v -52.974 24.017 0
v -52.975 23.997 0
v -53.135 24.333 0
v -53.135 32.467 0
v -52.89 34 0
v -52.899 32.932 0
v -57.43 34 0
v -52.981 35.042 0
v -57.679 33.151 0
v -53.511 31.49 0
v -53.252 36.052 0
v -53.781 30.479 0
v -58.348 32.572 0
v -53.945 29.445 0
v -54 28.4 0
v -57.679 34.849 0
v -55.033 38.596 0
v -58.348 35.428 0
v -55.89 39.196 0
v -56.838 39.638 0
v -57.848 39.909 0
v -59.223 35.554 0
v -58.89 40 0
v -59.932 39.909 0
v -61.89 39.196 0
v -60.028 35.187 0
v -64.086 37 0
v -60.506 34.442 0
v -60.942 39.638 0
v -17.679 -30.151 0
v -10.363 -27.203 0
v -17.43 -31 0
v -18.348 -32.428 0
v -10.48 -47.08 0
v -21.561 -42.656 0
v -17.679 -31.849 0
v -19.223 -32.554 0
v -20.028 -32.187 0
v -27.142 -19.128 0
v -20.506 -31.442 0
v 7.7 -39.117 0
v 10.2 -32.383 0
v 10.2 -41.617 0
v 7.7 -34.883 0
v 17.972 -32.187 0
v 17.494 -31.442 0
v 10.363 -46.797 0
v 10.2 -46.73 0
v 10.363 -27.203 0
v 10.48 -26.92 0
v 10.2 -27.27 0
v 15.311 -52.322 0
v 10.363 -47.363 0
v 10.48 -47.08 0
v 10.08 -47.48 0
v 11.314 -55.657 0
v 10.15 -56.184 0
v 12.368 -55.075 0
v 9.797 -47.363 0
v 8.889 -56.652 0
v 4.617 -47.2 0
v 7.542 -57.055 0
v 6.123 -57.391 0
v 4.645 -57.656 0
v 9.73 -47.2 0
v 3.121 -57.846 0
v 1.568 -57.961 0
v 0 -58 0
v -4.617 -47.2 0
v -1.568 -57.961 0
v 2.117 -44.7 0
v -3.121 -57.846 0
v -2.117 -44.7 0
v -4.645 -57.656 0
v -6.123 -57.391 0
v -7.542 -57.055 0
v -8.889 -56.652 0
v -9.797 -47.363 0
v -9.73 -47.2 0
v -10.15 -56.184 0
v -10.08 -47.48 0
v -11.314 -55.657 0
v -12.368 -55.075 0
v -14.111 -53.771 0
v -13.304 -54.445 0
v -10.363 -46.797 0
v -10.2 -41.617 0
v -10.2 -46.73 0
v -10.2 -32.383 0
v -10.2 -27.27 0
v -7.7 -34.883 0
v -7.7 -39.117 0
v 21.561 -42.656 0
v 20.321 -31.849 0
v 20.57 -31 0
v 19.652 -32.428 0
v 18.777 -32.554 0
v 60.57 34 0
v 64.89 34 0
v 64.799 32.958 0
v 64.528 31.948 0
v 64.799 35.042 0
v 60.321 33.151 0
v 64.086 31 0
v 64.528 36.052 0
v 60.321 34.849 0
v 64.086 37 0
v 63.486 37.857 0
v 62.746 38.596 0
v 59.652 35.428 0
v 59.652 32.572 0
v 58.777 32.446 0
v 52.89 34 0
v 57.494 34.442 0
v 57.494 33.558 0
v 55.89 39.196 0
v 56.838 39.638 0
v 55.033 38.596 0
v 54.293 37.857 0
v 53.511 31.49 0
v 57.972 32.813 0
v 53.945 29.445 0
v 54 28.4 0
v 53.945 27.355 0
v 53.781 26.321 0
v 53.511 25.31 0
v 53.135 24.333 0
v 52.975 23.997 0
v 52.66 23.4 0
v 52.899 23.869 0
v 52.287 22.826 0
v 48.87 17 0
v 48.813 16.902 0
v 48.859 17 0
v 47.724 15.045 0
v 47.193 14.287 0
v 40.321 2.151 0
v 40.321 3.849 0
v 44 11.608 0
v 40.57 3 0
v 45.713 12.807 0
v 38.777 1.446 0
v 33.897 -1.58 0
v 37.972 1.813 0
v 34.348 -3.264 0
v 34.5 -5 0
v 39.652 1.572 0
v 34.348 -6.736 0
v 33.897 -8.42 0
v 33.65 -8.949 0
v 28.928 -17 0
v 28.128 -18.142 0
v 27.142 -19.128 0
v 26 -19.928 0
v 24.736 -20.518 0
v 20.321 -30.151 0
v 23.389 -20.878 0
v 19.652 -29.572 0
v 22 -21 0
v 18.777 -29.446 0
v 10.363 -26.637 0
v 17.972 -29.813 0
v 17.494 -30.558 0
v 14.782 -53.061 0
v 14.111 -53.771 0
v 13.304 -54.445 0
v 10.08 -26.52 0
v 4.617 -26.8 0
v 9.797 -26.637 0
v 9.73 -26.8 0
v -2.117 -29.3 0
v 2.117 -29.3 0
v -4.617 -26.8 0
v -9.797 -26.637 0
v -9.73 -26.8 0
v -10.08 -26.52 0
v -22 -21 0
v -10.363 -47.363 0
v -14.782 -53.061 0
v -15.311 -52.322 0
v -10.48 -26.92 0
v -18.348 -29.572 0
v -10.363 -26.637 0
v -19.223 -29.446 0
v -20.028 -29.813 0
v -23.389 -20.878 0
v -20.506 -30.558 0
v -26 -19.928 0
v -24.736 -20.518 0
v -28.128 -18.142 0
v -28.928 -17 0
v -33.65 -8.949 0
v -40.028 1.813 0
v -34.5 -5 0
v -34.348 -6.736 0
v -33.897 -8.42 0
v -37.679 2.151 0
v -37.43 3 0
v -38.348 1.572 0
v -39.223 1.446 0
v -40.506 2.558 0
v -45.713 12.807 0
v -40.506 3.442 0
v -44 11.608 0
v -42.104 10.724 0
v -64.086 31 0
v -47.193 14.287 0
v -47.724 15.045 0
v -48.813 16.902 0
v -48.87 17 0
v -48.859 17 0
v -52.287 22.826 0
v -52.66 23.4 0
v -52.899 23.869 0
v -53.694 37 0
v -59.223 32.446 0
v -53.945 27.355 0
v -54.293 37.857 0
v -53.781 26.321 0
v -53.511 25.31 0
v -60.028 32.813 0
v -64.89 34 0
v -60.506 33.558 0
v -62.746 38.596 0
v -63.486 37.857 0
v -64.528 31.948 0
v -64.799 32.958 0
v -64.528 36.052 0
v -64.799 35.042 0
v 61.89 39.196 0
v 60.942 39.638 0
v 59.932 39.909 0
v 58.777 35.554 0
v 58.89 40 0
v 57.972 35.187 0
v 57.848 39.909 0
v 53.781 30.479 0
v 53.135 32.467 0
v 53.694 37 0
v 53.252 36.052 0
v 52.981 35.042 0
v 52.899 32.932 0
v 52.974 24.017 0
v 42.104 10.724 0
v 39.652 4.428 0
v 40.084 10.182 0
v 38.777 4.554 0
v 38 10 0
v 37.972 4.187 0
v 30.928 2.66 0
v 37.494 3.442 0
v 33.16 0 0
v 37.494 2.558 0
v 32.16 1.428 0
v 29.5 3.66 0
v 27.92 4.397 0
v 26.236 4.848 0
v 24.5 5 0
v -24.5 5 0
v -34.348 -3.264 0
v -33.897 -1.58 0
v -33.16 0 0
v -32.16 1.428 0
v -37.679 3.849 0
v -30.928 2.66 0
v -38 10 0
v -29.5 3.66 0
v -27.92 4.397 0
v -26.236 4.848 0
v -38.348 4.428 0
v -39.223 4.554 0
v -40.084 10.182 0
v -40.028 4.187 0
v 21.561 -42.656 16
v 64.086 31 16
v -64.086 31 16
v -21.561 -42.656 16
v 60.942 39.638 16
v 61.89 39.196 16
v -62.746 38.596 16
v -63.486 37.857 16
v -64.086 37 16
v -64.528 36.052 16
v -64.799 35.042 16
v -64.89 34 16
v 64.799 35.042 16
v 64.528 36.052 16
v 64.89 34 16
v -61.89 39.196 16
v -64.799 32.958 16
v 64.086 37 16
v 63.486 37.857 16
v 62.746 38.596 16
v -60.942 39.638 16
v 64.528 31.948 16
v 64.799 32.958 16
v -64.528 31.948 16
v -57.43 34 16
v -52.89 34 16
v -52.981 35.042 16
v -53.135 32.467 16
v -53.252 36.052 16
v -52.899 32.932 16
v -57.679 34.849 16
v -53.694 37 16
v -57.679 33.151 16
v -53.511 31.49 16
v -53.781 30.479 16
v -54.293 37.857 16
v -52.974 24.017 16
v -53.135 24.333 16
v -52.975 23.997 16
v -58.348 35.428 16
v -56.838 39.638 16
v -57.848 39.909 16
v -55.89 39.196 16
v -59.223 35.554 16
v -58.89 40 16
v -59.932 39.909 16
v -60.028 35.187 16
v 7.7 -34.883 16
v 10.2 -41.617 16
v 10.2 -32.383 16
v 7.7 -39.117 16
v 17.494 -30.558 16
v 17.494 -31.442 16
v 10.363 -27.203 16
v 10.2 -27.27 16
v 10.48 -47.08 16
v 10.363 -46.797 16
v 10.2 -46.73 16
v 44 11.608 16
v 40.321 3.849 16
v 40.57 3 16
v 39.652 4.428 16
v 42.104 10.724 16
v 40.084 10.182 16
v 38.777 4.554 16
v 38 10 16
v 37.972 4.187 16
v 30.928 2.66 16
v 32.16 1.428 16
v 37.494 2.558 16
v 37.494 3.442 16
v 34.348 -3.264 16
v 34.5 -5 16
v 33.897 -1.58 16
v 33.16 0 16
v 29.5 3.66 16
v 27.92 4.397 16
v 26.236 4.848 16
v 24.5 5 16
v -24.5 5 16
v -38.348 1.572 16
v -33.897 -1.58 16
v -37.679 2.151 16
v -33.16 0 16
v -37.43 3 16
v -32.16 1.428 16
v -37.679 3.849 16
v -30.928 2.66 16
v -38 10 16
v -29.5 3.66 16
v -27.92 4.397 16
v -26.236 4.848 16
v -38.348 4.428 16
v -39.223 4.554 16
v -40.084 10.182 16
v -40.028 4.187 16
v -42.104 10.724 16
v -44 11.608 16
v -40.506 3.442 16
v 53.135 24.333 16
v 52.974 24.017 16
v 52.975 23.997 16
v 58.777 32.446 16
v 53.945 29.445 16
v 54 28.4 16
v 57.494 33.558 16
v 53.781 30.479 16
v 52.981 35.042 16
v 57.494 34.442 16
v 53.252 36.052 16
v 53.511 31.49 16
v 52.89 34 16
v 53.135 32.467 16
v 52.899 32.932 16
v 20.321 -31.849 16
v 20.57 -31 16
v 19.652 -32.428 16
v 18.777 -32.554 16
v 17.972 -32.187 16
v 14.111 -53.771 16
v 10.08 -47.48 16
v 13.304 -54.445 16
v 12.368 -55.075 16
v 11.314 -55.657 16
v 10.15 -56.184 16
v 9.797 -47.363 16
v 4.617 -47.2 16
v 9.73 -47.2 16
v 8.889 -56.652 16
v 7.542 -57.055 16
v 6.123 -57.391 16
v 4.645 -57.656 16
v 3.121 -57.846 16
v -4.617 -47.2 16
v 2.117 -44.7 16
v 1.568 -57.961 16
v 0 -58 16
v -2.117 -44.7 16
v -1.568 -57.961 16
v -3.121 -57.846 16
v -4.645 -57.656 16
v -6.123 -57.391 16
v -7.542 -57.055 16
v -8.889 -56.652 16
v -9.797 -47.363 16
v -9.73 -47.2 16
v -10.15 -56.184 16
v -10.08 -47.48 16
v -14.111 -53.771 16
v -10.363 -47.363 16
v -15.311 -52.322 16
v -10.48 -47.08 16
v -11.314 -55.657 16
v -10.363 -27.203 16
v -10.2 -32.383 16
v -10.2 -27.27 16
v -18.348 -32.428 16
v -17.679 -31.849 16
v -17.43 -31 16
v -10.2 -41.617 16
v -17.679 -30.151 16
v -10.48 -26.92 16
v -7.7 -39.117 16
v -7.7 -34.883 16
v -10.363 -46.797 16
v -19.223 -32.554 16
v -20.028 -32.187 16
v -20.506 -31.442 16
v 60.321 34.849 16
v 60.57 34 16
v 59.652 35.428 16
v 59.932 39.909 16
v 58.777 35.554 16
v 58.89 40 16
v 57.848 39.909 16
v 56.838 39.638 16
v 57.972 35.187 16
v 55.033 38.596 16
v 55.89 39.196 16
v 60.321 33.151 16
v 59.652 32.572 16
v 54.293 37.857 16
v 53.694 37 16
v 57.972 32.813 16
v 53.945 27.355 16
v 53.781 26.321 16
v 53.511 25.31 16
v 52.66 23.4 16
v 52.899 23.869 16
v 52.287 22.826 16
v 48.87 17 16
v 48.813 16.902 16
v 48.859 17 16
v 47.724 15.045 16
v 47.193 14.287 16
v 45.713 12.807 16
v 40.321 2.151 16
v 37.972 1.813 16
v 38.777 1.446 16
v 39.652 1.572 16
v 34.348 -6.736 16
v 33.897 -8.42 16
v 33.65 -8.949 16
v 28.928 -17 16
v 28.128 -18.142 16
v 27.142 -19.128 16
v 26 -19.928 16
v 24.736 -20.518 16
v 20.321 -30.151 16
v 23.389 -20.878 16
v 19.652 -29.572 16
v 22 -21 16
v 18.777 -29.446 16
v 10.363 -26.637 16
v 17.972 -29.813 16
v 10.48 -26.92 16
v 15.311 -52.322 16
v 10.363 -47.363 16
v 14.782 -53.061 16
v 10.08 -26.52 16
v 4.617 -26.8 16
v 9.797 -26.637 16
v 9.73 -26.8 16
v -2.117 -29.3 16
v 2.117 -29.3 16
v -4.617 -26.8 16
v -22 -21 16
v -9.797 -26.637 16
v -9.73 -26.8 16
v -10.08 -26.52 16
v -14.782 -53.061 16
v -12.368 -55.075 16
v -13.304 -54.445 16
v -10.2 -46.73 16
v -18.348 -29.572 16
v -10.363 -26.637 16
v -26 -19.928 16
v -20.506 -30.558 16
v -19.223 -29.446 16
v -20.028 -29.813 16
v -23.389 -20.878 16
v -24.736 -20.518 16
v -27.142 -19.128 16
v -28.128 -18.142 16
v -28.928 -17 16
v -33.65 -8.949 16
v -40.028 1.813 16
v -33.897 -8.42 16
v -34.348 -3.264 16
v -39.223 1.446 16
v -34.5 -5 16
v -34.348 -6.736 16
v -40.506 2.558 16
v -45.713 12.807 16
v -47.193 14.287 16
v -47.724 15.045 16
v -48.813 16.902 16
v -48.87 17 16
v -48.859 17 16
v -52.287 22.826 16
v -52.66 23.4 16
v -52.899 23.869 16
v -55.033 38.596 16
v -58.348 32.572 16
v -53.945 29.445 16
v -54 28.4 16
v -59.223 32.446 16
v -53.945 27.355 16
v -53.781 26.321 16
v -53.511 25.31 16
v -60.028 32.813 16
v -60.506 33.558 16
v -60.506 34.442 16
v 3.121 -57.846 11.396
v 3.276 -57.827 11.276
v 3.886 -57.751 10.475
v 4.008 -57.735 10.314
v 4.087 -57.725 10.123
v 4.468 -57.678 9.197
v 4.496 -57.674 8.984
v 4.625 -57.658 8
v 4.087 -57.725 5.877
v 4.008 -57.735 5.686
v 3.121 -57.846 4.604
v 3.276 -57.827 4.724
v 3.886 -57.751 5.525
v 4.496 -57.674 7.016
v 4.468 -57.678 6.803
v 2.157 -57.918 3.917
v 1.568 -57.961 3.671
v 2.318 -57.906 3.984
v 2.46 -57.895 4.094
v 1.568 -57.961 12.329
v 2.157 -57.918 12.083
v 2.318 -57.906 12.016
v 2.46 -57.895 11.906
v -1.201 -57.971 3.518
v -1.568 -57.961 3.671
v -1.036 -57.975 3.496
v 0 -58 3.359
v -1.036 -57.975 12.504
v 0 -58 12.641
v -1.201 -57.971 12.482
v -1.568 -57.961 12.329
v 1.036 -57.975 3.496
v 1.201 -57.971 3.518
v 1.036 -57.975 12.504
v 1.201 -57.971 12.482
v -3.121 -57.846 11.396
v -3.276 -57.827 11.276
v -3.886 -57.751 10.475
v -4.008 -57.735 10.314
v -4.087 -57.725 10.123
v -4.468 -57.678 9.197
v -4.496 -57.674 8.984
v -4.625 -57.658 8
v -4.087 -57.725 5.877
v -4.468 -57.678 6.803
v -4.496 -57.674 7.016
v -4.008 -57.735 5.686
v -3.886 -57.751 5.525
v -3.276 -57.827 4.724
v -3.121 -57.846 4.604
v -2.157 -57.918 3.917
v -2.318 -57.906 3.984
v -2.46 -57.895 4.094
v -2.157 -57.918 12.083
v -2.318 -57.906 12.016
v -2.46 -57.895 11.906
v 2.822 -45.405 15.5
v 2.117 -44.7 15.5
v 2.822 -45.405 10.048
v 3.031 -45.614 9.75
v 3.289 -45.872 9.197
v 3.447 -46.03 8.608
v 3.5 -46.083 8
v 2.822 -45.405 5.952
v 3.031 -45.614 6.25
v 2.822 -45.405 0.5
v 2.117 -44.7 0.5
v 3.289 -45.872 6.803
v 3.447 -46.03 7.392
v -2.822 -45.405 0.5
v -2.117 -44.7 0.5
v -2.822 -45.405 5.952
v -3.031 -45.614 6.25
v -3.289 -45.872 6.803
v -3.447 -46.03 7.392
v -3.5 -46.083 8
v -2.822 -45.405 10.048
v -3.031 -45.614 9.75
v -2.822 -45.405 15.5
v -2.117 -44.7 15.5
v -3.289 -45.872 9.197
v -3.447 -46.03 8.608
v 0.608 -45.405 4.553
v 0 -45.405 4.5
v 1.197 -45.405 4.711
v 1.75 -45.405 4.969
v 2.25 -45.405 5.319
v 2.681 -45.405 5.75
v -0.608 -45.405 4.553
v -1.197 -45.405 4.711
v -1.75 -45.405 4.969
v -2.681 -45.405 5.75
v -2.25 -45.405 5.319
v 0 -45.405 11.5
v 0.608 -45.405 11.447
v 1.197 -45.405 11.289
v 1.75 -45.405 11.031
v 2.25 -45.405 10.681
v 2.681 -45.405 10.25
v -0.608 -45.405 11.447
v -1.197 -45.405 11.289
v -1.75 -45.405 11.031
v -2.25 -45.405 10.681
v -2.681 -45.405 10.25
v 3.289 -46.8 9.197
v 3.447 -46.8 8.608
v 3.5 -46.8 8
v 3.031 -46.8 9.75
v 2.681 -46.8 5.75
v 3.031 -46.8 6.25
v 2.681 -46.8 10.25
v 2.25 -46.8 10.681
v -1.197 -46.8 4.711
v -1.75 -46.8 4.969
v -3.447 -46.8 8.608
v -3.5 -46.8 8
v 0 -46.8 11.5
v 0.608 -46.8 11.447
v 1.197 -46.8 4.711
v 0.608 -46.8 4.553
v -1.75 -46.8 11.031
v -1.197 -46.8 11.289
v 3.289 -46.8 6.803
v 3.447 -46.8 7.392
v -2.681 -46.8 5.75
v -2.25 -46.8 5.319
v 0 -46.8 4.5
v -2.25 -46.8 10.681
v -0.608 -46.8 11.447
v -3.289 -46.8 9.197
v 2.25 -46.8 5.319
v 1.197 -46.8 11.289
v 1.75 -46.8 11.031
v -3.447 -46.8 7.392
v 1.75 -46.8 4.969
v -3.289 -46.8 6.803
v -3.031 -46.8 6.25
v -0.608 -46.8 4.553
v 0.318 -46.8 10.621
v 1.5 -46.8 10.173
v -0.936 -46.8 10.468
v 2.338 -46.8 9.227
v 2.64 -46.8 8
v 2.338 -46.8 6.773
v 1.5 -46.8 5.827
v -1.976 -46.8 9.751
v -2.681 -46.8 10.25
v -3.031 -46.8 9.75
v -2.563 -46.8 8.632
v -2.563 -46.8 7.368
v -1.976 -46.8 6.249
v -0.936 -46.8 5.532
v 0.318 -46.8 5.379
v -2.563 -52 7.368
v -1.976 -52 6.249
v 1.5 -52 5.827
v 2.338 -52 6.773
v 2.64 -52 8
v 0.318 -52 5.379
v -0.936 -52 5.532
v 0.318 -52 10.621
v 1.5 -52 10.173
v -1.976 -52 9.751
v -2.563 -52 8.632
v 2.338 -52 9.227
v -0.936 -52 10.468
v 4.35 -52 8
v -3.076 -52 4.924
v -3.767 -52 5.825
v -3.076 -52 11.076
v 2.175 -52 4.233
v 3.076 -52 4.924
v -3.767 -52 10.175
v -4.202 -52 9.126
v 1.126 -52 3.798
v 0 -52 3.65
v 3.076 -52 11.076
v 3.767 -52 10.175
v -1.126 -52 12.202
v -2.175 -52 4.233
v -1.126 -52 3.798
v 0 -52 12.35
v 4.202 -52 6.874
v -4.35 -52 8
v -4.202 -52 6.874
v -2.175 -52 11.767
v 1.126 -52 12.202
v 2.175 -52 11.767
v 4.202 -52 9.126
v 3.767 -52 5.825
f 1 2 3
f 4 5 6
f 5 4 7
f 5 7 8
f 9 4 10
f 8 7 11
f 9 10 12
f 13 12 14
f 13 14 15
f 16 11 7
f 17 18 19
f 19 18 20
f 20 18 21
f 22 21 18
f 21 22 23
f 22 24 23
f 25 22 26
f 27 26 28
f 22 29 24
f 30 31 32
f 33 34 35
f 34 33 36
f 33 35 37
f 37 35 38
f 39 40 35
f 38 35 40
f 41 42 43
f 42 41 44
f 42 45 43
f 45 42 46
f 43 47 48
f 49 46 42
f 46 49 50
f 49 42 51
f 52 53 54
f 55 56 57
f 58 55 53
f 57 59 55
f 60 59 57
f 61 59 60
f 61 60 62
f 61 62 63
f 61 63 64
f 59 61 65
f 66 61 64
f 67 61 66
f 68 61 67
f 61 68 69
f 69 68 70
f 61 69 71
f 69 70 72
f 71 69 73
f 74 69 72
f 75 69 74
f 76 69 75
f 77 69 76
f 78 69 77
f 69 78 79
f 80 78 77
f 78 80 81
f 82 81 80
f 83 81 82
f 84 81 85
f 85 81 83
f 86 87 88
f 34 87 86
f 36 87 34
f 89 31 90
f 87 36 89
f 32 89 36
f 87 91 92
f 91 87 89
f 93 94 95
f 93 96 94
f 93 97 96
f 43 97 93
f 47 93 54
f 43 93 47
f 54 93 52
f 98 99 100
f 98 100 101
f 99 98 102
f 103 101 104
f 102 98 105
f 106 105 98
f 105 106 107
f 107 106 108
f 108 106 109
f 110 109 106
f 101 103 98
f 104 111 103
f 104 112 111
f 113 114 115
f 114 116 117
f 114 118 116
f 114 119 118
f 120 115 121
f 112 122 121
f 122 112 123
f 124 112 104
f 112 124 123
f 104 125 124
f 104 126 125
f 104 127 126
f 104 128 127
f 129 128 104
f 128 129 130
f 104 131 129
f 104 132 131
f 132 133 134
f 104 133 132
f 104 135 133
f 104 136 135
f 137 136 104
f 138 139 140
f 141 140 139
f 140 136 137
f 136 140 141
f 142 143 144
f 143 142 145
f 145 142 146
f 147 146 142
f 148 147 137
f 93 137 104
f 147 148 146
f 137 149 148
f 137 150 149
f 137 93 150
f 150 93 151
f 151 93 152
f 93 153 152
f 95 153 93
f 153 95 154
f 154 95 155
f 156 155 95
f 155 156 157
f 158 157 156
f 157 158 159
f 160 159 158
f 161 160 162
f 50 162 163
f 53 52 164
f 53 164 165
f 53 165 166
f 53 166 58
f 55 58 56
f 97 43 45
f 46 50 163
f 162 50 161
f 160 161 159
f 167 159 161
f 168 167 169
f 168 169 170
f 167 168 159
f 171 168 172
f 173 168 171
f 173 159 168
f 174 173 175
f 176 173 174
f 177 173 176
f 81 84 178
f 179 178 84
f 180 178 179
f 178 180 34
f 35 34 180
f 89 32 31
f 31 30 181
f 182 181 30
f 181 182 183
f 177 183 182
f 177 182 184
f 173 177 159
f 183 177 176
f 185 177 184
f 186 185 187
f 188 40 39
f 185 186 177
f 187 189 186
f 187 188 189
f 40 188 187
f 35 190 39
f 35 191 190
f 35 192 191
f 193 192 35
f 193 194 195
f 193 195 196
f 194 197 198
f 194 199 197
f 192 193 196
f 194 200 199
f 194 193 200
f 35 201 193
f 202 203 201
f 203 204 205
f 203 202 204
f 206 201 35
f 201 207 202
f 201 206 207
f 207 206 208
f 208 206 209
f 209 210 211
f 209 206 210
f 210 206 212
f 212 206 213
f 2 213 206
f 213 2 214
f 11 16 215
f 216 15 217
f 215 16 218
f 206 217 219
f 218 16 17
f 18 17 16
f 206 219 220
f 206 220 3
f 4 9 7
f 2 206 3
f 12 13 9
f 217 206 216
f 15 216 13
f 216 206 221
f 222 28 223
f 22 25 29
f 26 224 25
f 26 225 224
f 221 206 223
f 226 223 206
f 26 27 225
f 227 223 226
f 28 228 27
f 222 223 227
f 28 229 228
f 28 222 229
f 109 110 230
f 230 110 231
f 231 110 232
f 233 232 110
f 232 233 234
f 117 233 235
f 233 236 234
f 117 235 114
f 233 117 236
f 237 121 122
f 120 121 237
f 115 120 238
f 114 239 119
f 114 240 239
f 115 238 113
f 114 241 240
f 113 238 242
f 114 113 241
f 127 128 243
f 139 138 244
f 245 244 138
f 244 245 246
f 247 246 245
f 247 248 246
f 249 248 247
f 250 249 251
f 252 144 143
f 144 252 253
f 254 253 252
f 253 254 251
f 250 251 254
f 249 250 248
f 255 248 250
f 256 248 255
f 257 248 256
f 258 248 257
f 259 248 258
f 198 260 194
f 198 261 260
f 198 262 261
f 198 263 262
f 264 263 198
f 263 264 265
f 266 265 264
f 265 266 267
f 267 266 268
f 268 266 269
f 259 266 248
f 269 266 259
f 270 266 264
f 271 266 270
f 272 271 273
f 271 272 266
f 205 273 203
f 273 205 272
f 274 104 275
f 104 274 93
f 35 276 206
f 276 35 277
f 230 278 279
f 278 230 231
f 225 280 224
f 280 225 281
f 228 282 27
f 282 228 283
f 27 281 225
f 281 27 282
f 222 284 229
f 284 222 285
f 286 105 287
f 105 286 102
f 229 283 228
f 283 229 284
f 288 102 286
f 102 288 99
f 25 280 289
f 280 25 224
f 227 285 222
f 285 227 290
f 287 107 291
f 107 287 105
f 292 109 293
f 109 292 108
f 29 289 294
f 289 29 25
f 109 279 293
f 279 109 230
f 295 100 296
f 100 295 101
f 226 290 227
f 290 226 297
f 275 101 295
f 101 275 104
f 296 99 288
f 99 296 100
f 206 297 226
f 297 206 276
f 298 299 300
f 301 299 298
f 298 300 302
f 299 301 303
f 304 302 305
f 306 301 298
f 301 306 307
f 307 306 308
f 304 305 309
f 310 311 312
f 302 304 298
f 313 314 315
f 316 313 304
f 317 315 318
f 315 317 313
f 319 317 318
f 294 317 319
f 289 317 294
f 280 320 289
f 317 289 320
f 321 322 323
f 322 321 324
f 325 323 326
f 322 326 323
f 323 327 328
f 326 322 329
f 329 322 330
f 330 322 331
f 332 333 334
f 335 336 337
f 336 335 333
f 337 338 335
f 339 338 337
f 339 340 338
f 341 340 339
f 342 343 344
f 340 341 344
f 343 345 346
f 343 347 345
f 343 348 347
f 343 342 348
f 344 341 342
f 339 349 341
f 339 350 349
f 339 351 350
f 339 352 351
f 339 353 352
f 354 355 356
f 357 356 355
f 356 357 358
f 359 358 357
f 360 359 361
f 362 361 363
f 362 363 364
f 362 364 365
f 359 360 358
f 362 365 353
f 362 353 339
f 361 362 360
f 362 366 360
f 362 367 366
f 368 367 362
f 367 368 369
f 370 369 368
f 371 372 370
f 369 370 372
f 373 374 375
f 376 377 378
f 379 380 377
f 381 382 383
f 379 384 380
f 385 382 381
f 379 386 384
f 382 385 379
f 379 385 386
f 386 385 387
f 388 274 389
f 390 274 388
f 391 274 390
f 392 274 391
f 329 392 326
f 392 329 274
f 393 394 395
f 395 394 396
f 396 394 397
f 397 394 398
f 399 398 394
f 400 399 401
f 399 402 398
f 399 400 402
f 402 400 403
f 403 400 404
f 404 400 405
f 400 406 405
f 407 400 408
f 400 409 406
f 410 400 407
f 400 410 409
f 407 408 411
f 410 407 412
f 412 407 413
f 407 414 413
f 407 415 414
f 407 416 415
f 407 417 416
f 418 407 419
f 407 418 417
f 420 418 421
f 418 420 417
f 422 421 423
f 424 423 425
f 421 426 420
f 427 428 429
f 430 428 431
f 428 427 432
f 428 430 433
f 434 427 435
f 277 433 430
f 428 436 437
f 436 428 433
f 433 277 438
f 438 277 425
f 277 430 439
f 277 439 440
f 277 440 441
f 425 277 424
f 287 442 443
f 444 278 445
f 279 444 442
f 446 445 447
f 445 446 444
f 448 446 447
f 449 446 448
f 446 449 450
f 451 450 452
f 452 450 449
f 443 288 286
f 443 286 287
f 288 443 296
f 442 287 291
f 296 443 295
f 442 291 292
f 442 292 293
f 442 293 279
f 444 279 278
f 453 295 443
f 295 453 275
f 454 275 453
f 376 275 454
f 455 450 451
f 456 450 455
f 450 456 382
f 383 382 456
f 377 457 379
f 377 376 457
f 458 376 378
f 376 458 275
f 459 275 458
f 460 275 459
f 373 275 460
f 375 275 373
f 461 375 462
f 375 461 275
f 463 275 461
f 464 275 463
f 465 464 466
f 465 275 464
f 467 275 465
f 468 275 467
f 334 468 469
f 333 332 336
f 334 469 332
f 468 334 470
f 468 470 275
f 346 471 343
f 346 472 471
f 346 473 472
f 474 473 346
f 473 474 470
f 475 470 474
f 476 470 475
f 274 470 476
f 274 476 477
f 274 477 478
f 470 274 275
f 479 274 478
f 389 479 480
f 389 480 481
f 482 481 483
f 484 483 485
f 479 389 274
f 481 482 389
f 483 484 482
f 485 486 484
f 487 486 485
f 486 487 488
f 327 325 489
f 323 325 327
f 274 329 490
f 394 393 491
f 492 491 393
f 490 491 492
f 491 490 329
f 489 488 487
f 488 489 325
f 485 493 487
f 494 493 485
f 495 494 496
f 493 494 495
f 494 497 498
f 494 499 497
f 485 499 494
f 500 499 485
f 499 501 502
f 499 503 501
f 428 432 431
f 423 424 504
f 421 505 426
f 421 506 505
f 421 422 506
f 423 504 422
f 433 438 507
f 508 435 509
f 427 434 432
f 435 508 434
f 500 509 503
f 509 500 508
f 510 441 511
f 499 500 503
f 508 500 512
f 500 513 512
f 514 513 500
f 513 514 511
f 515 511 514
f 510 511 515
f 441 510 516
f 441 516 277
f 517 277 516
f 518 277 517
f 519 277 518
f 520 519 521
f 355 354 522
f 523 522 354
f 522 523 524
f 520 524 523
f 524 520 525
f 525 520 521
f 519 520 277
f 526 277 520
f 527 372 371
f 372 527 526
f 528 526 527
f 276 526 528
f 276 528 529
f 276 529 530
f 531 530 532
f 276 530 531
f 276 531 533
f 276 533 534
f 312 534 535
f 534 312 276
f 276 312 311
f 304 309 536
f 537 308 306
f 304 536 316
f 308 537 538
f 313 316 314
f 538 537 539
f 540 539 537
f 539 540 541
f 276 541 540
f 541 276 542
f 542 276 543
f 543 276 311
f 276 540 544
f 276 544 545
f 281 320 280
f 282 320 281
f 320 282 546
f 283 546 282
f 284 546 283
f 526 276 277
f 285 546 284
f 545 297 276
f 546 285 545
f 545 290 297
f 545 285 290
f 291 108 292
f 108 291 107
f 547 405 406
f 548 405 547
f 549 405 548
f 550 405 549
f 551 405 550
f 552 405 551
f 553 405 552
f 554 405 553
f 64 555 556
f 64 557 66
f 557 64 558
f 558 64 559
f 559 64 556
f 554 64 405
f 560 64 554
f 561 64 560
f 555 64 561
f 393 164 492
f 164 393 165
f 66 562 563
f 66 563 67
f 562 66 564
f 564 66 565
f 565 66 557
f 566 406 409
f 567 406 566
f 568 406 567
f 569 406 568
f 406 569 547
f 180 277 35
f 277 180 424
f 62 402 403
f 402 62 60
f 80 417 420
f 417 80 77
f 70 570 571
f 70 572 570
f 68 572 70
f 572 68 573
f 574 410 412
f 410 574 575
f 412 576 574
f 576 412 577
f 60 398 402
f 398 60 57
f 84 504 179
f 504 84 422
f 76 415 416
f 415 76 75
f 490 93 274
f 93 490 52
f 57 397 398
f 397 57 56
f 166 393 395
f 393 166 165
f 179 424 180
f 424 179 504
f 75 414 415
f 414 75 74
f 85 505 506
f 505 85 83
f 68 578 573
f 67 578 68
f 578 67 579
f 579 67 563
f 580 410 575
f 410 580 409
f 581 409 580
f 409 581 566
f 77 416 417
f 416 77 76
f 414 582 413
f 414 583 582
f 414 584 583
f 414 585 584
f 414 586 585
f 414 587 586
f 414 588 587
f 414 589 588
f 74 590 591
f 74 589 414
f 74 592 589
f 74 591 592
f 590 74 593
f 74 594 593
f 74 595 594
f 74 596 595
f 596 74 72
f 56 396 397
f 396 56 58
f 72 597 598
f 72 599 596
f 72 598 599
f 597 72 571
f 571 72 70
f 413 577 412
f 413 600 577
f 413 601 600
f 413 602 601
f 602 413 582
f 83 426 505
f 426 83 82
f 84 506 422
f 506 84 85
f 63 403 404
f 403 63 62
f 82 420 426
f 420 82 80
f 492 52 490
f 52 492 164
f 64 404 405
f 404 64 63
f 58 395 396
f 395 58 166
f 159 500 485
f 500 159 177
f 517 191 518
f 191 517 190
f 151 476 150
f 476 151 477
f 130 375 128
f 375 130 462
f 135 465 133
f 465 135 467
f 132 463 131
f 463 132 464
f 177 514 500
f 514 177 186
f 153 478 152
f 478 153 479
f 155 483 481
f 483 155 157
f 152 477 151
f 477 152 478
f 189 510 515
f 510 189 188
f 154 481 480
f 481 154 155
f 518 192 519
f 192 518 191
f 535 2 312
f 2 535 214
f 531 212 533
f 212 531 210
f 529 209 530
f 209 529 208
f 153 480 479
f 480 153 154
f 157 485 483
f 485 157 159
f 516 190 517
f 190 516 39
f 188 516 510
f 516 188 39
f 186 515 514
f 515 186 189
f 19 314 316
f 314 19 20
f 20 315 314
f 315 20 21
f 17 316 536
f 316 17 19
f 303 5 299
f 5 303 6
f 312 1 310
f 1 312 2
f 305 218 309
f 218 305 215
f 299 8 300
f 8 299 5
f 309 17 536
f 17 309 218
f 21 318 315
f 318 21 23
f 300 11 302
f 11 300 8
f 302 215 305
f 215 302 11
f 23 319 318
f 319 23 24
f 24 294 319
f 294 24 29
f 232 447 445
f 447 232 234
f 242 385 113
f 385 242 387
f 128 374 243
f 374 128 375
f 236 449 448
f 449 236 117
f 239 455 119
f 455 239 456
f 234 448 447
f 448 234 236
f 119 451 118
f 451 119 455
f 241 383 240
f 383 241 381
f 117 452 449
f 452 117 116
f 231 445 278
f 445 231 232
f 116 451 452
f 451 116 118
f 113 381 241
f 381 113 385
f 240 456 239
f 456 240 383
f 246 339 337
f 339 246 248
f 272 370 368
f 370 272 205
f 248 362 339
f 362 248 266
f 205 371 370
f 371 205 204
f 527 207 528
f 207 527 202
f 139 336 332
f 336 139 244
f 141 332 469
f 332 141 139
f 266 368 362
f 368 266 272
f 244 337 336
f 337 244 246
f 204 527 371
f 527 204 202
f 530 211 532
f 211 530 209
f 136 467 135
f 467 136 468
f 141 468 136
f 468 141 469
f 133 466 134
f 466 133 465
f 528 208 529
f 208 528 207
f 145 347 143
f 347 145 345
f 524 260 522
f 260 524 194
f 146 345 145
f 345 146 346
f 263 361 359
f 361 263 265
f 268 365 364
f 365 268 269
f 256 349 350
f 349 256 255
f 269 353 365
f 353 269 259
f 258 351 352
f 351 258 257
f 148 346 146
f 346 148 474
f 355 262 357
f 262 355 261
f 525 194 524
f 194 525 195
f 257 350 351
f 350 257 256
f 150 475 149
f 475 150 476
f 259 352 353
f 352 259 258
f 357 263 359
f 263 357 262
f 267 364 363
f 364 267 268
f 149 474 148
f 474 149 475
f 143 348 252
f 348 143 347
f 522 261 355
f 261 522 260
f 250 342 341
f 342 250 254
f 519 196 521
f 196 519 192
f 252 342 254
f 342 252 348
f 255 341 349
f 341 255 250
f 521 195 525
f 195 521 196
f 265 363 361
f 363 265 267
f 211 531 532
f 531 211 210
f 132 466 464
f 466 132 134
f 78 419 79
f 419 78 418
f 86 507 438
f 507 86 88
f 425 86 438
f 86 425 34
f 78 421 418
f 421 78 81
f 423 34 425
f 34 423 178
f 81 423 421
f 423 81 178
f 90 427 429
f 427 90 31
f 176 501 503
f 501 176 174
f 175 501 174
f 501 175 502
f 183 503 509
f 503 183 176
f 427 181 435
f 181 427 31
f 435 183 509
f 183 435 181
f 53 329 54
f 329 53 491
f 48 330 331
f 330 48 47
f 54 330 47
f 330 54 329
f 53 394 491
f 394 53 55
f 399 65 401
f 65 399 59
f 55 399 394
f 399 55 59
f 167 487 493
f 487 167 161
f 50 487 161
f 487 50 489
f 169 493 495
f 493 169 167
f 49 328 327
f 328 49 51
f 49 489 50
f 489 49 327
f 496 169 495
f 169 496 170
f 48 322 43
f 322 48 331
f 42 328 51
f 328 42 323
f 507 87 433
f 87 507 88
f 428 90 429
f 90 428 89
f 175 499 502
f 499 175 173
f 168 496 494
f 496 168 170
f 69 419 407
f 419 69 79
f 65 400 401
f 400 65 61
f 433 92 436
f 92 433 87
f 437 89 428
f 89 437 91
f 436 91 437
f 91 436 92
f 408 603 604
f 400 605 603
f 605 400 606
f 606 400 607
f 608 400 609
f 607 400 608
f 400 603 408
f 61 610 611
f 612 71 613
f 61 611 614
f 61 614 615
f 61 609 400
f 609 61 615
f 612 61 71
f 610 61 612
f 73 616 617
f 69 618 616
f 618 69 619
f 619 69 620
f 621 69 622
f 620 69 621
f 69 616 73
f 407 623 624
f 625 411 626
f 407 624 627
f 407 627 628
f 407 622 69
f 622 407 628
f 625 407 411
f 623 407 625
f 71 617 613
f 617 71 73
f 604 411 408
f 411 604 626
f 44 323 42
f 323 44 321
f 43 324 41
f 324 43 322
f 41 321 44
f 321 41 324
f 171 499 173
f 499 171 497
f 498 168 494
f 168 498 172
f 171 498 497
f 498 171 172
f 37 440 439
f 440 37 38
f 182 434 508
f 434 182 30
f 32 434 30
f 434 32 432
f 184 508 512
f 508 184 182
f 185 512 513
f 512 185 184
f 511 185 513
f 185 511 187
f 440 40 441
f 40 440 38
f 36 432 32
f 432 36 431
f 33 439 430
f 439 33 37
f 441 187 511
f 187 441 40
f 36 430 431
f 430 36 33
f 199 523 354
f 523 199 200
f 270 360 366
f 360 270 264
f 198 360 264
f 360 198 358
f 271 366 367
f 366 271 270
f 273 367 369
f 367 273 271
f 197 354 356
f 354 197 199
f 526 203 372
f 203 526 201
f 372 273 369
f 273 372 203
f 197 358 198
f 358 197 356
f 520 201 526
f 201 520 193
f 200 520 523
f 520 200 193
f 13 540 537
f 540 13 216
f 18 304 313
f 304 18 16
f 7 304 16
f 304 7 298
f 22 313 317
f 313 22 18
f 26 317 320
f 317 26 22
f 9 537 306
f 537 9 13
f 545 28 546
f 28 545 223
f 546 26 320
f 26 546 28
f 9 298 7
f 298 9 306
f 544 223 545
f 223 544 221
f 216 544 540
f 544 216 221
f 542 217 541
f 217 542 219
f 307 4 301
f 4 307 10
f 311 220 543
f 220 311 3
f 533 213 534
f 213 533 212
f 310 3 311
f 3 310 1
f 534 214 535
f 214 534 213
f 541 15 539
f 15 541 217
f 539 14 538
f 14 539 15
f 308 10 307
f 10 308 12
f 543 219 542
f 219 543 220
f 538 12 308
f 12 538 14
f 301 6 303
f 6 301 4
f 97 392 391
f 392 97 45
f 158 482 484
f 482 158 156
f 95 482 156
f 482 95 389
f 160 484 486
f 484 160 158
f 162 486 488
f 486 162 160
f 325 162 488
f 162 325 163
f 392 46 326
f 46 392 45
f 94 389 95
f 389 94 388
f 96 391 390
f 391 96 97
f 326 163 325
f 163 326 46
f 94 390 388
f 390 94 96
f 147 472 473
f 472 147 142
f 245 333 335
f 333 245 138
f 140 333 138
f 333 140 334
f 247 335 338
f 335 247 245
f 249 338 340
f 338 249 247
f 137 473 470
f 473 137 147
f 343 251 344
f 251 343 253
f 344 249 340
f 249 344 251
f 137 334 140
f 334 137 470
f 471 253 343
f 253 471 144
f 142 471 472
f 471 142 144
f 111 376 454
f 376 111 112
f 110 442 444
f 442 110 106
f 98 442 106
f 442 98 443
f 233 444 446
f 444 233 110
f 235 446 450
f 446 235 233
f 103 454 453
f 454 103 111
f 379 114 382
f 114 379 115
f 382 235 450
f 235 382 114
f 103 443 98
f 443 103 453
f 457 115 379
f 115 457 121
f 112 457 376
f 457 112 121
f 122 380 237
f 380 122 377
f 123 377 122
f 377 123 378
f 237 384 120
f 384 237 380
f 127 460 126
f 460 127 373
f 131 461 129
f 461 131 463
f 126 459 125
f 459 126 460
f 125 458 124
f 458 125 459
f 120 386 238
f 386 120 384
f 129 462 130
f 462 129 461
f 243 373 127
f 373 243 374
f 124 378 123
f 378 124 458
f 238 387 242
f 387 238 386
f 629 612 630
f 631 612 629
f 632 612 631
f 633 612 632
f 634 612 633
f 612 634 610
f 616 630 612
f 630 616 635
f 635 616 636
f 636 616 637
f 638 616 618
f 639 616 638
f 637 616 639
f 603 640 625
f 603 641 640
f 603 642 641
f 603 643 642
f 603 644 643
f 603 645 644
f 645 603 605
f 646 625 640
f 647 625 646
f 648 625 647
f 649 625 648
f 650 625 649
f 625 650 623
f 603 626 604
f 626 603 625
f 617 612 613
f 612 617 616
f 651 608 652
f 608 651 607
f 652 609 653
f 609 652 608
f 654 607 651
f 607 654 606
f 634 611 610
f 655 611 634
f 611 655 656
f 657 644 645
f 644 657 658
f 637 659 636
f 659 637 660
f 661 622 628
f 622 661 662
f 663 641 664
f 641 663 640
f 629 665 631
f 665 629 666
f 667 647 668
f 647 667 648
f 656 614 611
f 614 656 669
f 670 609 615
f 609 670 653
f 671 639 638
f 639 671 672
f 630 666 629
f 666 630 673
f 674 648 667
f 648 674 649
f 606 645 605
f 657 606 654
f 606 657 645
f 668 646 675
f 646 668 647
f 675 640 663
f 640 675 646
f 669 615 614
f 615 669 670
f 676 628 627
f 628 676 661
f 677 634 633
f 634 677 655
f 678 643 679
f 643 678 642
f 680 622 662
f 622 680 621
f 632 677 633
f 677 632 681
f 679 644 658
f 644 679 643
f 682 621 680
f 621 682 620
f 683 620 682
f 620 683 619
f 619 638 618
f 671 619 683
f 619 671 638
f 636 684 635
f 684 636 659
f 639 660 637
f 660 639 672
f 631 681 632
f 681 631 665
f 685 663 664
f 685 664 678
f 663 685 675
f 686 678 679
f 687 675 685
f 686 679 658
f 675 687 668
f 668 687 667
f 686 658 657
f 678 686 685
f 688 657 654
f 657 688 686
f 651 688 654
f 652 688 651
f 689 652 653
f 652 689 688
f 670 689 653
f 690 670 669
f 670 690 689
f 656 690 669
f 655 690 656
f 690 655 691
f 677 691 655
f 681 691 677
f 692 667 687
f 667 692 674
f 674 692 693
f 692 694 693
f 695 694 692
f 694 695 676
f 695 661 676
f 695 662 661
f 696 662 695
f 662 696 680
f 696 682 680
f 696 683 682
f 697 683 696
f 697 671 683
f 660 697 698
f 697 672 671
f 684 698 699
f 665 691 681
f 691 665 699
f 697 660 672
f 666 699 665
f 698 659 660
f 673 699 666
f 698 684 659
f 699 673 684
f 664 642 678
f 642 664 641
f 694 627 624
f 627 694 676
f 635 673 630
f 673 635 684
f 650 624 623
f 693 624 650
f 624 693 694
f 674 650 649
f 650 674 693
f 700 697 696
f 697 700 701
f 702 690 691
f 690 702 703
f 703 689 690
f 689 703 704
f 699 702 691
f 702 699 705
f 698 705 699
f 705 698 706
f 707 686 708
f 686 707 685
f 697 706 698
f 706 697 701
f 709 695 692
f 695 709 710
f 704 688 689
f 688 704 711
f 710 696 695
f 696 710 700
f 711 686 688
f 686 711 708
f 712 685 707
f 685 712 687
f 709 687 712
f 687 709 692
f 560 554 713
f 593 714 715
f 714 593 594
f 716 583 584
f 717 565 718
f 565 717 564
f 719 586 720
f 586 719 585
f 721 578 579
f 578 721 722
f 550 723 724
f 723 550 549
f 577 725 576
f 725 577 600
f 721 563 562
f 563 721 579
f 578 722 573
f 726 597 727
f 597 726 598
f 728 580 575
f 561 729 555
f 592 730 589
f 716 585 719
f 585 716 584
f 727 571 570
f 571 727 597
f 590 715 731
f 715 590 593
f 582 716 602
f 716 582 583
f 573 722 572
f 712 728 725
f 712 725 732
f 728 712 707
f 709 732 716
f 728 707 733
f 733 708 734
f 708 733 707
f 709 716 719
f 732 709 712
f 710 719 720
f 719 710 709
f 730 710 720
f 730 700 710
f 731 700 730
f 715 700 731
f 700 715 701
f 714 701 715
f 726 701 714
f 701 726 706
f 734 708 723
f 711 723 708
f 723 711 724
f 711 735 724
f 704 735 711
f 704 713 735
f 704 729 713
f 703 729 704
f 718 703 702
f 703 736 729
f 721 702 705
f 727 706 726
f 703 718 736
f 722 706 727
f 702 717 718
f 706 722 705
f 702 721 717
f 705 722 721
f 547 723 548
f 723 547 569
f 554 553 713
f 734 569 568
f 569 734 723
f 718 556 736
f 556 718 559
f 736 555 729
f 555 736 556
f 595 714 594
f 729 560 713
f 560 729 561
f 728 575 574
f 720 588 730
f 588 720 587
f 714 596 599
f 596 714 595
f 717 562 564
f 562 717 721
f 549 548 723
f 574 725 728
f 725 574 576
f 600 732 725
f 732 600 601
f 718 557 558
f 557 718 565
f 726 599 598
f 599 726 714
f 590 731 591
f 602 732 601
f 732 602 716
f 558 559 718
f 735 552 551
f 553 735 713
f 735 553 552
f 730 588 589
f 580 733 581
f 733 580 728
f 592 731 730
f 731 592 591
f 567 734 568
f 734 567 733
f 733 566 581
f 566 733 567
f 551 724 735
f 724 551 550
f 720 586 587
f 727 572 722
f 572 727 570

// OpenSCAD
// file: ext20v.scad
// cut-out model to fit Openbuilds V-Slot 20mm extrusion

// fuzz is -1/2 kerf for a laser cutter,
// or the amount of extrusion spread for a 3D printer

module slotV(len,fuzz,verbose) {
// center of square cylinder for V cut-out is 1mm outside of extrusion.
// outside border of extrusion is 1.9mm.  inner slot width is 6.35mm, but
// corners are beveled, so ideal corner would be less
// 1/2 slot width is the same dist as sr-(1+1.9), hence
sr = 1+1.9+(6.2/2);
  difference() {
    // having testing trouble.  I don't want to worry about v-slot tab yet.
    // make it extra small until I'm really ready to tweak it (remove -.3)
    translate([-10-1,0,0]) cylinder(r=sr-fuzz*sqrt(2)-.3,h=len,$fn=4);
    translate([-8+.3+4/2,0,len/2]) cube([4,7,len],center=true);  // arbitrary .3mm extra lip to tab
  }

  // actual slot profile
  if(verbose % 2) %hull() {
    translate([-10+2+1.2/2,0,len/2]) cube([1.2,10.6,len],center=true);
    translate([-5,0,len/2]) cube([2,4,len],center=true);
  }
}

module ext20(len,fuzz=0,verbose=3) {
w=20+2*fuzz;
w2f = w/2 - 0.6*abs(fuzz);  // offset to center of corner stress relief loop
rc = (abs(fuzz) < 0.1) ? 0.2 : 2*abs(fuzz);  // radius of corner releif loop
ro=1;
$fn=24;
  difference() {
    union() {
      translate([0,0,len/2]) cube([w,w,len],center=true);
      for(i=[-1,1]) for(j=[-1,1]) // extra clearance around corners
        translate([w2f*i,w2f*j,0]) cylinder(r=rc,h=len,$fn=8);
    }

    translate([0,0,-1]) {
      for (a=[0,90,180,270]) {
        rotate([0,0,a])
          slotV(len+2,fuzz,verbose);
      }
      if (floor(verbose/2) % 2) %cylinder(r=2,h=len+2);
    }
  }
}

if (0) { // notional display
  translate([0,0,4]) ext20(5,0.2);
  ext20(5,0);
  translate([0,0,-4]) ext20(5,-0.2);
} else {
  // quality of fit cutout test cut/print
  projection(cut=true)
  difference() {
    cube([30,30,10],center=true);
    translate([0,0,-12/2]) ext20(12,-0.15); // quelab laser cutter
  }
}
// main file
//use <ext20.scad>;
use <ext20v.scad>;

module vertexBframe(thick) {
t2 = thick+2;
  union() {
    difference() {
      intersection() {
        hull() for(a=[0,120,240]) rotate([0,0,a])
          translate([0,-68,0]) cylinder(r=6,h=thick,$fn=36);
        translate([0,0,-1]) hull() {
          translate([0,-50,0]) 
            scale([16,8,1]) cylinder(r=1,h=t2+2,$fn=64);
          translate([-75,40,0]) cube([150,4,t2]);
        }
      }

      // clear out main interior V
      hull() {
        for(a=[-1,1]) { translate([22*a,-13,-1]) cylinder(r=8,h=t2,$fn=36); }
        translate([0,45,thick/2]) cube([130,1,t2],center=true);
      }
    }

    // diagnostic ruler.  We want about 36mm between front of nema17
    // and front edge of extrusion
    %translate([0,-9,9]) cube([2,36,t2*2],center=true);

    for(a=[-1,1]) {
      hull() {
        translate([cos(30)*68*a,68/2,0]) cylinder(r=6,h=thick,$fn=36);
        translate([54*a,21,0]) cylinder(r=1,h=thick,$fn=6);
      }
    }
  }
}

// brace across vertex.  custom sizing
module braceRail(thick) {
t2 = thick+2;
  difference() {
    translate([-55,-15,0]) cube([110,27,thick]);

    translate([0,0,-1]) {  // make all subtractions a little wide to make sure it is a clean cut
      hull() {
        for (a=[-1,1]) { translate([38*a,17,0]) cylinder(r=12,h=t2,$fn=36); }
      }
      hull() {
        for (a=[-1,1]) { translate([24.5*a,-10,0]) cylinder(r=10,h=t2,$fn=36); }
      }
      for(a=[-1,1]) { translate([54*a,-7,t2/2]) rotate([0,0,-30*a])
        cube([20,50,t2],center=true);
      }
    }
  }
}

module m3hole(thick,fuzz) { cylinder(r=2.94/2+fuzz, h=thick+2, $fn=11); }
module m5socketHead(len,fuzz,counterSink=0) {
  union() {
    translate([0,0,-0.03]) cylinder(h=len+0.03,r=4.88/2+fuzz, $fn=13);
    translate([0,0,-5-counterSink])
      cylinder(h=5+counterSink,
        r1=8.5/2+fuzz+(len+counterSink)*0.02,
        r2=8.5/2+fuzz-0.1,
        $fn=24);
  }
}
module m5slotNut() {
  translate([0,0,-1.6/2]) cube([10,15,1.61],center=true);
  cylinder(h=1.4,r=7/2,$fn=36);
}
module extrusionAnchorCutout(z,fuzz) {
  translate([0,-52,z]) {
    translate([0,6.6,0]) rotate([ 90,0,0]) m5slotNut();
    rotate([-90,0,0]) m5socketHead(10,fuzz,2);
  }
}

module vertexB(thick,fuzz) {
  difference() {
    union() {
      vertexBframe(thick);
      translate([0,5,0]) braceRail(thick);
    }

    translate([0,0,-1]) {
      translate([0,-37,0]) ext20(thick+11*0.2,fuzz,2);

      // M3 drill holes
      for(a=[-1,1]) {
        translate([19*a,-31,0]) m3hole(thick,fuzz/2);
        translate([39*a,  3,0]) m3hole(thick,fuzz/2);
        translate([59*a, 34,0]) m3hole(thick,fuzz/2);

        //smooth outer ear transition
        translate([44*a,28.4,0]) cylinder(r=10,h=thick+2,$fn=60);
      }
    } // end of z=-1 shift for subtractions

    // extrusion anchor screw(s)
    if(thick < 21) {
      extrusionAnchorCutout(thick/2,fuzz);
    } else {
      extrusionAnchorCutout(      9,fuzz);
      extrusionAnchorCutout(thick-9,fuzz);
    }

  } // end of difference   
}

vertexB(1?16:45,0.2);
